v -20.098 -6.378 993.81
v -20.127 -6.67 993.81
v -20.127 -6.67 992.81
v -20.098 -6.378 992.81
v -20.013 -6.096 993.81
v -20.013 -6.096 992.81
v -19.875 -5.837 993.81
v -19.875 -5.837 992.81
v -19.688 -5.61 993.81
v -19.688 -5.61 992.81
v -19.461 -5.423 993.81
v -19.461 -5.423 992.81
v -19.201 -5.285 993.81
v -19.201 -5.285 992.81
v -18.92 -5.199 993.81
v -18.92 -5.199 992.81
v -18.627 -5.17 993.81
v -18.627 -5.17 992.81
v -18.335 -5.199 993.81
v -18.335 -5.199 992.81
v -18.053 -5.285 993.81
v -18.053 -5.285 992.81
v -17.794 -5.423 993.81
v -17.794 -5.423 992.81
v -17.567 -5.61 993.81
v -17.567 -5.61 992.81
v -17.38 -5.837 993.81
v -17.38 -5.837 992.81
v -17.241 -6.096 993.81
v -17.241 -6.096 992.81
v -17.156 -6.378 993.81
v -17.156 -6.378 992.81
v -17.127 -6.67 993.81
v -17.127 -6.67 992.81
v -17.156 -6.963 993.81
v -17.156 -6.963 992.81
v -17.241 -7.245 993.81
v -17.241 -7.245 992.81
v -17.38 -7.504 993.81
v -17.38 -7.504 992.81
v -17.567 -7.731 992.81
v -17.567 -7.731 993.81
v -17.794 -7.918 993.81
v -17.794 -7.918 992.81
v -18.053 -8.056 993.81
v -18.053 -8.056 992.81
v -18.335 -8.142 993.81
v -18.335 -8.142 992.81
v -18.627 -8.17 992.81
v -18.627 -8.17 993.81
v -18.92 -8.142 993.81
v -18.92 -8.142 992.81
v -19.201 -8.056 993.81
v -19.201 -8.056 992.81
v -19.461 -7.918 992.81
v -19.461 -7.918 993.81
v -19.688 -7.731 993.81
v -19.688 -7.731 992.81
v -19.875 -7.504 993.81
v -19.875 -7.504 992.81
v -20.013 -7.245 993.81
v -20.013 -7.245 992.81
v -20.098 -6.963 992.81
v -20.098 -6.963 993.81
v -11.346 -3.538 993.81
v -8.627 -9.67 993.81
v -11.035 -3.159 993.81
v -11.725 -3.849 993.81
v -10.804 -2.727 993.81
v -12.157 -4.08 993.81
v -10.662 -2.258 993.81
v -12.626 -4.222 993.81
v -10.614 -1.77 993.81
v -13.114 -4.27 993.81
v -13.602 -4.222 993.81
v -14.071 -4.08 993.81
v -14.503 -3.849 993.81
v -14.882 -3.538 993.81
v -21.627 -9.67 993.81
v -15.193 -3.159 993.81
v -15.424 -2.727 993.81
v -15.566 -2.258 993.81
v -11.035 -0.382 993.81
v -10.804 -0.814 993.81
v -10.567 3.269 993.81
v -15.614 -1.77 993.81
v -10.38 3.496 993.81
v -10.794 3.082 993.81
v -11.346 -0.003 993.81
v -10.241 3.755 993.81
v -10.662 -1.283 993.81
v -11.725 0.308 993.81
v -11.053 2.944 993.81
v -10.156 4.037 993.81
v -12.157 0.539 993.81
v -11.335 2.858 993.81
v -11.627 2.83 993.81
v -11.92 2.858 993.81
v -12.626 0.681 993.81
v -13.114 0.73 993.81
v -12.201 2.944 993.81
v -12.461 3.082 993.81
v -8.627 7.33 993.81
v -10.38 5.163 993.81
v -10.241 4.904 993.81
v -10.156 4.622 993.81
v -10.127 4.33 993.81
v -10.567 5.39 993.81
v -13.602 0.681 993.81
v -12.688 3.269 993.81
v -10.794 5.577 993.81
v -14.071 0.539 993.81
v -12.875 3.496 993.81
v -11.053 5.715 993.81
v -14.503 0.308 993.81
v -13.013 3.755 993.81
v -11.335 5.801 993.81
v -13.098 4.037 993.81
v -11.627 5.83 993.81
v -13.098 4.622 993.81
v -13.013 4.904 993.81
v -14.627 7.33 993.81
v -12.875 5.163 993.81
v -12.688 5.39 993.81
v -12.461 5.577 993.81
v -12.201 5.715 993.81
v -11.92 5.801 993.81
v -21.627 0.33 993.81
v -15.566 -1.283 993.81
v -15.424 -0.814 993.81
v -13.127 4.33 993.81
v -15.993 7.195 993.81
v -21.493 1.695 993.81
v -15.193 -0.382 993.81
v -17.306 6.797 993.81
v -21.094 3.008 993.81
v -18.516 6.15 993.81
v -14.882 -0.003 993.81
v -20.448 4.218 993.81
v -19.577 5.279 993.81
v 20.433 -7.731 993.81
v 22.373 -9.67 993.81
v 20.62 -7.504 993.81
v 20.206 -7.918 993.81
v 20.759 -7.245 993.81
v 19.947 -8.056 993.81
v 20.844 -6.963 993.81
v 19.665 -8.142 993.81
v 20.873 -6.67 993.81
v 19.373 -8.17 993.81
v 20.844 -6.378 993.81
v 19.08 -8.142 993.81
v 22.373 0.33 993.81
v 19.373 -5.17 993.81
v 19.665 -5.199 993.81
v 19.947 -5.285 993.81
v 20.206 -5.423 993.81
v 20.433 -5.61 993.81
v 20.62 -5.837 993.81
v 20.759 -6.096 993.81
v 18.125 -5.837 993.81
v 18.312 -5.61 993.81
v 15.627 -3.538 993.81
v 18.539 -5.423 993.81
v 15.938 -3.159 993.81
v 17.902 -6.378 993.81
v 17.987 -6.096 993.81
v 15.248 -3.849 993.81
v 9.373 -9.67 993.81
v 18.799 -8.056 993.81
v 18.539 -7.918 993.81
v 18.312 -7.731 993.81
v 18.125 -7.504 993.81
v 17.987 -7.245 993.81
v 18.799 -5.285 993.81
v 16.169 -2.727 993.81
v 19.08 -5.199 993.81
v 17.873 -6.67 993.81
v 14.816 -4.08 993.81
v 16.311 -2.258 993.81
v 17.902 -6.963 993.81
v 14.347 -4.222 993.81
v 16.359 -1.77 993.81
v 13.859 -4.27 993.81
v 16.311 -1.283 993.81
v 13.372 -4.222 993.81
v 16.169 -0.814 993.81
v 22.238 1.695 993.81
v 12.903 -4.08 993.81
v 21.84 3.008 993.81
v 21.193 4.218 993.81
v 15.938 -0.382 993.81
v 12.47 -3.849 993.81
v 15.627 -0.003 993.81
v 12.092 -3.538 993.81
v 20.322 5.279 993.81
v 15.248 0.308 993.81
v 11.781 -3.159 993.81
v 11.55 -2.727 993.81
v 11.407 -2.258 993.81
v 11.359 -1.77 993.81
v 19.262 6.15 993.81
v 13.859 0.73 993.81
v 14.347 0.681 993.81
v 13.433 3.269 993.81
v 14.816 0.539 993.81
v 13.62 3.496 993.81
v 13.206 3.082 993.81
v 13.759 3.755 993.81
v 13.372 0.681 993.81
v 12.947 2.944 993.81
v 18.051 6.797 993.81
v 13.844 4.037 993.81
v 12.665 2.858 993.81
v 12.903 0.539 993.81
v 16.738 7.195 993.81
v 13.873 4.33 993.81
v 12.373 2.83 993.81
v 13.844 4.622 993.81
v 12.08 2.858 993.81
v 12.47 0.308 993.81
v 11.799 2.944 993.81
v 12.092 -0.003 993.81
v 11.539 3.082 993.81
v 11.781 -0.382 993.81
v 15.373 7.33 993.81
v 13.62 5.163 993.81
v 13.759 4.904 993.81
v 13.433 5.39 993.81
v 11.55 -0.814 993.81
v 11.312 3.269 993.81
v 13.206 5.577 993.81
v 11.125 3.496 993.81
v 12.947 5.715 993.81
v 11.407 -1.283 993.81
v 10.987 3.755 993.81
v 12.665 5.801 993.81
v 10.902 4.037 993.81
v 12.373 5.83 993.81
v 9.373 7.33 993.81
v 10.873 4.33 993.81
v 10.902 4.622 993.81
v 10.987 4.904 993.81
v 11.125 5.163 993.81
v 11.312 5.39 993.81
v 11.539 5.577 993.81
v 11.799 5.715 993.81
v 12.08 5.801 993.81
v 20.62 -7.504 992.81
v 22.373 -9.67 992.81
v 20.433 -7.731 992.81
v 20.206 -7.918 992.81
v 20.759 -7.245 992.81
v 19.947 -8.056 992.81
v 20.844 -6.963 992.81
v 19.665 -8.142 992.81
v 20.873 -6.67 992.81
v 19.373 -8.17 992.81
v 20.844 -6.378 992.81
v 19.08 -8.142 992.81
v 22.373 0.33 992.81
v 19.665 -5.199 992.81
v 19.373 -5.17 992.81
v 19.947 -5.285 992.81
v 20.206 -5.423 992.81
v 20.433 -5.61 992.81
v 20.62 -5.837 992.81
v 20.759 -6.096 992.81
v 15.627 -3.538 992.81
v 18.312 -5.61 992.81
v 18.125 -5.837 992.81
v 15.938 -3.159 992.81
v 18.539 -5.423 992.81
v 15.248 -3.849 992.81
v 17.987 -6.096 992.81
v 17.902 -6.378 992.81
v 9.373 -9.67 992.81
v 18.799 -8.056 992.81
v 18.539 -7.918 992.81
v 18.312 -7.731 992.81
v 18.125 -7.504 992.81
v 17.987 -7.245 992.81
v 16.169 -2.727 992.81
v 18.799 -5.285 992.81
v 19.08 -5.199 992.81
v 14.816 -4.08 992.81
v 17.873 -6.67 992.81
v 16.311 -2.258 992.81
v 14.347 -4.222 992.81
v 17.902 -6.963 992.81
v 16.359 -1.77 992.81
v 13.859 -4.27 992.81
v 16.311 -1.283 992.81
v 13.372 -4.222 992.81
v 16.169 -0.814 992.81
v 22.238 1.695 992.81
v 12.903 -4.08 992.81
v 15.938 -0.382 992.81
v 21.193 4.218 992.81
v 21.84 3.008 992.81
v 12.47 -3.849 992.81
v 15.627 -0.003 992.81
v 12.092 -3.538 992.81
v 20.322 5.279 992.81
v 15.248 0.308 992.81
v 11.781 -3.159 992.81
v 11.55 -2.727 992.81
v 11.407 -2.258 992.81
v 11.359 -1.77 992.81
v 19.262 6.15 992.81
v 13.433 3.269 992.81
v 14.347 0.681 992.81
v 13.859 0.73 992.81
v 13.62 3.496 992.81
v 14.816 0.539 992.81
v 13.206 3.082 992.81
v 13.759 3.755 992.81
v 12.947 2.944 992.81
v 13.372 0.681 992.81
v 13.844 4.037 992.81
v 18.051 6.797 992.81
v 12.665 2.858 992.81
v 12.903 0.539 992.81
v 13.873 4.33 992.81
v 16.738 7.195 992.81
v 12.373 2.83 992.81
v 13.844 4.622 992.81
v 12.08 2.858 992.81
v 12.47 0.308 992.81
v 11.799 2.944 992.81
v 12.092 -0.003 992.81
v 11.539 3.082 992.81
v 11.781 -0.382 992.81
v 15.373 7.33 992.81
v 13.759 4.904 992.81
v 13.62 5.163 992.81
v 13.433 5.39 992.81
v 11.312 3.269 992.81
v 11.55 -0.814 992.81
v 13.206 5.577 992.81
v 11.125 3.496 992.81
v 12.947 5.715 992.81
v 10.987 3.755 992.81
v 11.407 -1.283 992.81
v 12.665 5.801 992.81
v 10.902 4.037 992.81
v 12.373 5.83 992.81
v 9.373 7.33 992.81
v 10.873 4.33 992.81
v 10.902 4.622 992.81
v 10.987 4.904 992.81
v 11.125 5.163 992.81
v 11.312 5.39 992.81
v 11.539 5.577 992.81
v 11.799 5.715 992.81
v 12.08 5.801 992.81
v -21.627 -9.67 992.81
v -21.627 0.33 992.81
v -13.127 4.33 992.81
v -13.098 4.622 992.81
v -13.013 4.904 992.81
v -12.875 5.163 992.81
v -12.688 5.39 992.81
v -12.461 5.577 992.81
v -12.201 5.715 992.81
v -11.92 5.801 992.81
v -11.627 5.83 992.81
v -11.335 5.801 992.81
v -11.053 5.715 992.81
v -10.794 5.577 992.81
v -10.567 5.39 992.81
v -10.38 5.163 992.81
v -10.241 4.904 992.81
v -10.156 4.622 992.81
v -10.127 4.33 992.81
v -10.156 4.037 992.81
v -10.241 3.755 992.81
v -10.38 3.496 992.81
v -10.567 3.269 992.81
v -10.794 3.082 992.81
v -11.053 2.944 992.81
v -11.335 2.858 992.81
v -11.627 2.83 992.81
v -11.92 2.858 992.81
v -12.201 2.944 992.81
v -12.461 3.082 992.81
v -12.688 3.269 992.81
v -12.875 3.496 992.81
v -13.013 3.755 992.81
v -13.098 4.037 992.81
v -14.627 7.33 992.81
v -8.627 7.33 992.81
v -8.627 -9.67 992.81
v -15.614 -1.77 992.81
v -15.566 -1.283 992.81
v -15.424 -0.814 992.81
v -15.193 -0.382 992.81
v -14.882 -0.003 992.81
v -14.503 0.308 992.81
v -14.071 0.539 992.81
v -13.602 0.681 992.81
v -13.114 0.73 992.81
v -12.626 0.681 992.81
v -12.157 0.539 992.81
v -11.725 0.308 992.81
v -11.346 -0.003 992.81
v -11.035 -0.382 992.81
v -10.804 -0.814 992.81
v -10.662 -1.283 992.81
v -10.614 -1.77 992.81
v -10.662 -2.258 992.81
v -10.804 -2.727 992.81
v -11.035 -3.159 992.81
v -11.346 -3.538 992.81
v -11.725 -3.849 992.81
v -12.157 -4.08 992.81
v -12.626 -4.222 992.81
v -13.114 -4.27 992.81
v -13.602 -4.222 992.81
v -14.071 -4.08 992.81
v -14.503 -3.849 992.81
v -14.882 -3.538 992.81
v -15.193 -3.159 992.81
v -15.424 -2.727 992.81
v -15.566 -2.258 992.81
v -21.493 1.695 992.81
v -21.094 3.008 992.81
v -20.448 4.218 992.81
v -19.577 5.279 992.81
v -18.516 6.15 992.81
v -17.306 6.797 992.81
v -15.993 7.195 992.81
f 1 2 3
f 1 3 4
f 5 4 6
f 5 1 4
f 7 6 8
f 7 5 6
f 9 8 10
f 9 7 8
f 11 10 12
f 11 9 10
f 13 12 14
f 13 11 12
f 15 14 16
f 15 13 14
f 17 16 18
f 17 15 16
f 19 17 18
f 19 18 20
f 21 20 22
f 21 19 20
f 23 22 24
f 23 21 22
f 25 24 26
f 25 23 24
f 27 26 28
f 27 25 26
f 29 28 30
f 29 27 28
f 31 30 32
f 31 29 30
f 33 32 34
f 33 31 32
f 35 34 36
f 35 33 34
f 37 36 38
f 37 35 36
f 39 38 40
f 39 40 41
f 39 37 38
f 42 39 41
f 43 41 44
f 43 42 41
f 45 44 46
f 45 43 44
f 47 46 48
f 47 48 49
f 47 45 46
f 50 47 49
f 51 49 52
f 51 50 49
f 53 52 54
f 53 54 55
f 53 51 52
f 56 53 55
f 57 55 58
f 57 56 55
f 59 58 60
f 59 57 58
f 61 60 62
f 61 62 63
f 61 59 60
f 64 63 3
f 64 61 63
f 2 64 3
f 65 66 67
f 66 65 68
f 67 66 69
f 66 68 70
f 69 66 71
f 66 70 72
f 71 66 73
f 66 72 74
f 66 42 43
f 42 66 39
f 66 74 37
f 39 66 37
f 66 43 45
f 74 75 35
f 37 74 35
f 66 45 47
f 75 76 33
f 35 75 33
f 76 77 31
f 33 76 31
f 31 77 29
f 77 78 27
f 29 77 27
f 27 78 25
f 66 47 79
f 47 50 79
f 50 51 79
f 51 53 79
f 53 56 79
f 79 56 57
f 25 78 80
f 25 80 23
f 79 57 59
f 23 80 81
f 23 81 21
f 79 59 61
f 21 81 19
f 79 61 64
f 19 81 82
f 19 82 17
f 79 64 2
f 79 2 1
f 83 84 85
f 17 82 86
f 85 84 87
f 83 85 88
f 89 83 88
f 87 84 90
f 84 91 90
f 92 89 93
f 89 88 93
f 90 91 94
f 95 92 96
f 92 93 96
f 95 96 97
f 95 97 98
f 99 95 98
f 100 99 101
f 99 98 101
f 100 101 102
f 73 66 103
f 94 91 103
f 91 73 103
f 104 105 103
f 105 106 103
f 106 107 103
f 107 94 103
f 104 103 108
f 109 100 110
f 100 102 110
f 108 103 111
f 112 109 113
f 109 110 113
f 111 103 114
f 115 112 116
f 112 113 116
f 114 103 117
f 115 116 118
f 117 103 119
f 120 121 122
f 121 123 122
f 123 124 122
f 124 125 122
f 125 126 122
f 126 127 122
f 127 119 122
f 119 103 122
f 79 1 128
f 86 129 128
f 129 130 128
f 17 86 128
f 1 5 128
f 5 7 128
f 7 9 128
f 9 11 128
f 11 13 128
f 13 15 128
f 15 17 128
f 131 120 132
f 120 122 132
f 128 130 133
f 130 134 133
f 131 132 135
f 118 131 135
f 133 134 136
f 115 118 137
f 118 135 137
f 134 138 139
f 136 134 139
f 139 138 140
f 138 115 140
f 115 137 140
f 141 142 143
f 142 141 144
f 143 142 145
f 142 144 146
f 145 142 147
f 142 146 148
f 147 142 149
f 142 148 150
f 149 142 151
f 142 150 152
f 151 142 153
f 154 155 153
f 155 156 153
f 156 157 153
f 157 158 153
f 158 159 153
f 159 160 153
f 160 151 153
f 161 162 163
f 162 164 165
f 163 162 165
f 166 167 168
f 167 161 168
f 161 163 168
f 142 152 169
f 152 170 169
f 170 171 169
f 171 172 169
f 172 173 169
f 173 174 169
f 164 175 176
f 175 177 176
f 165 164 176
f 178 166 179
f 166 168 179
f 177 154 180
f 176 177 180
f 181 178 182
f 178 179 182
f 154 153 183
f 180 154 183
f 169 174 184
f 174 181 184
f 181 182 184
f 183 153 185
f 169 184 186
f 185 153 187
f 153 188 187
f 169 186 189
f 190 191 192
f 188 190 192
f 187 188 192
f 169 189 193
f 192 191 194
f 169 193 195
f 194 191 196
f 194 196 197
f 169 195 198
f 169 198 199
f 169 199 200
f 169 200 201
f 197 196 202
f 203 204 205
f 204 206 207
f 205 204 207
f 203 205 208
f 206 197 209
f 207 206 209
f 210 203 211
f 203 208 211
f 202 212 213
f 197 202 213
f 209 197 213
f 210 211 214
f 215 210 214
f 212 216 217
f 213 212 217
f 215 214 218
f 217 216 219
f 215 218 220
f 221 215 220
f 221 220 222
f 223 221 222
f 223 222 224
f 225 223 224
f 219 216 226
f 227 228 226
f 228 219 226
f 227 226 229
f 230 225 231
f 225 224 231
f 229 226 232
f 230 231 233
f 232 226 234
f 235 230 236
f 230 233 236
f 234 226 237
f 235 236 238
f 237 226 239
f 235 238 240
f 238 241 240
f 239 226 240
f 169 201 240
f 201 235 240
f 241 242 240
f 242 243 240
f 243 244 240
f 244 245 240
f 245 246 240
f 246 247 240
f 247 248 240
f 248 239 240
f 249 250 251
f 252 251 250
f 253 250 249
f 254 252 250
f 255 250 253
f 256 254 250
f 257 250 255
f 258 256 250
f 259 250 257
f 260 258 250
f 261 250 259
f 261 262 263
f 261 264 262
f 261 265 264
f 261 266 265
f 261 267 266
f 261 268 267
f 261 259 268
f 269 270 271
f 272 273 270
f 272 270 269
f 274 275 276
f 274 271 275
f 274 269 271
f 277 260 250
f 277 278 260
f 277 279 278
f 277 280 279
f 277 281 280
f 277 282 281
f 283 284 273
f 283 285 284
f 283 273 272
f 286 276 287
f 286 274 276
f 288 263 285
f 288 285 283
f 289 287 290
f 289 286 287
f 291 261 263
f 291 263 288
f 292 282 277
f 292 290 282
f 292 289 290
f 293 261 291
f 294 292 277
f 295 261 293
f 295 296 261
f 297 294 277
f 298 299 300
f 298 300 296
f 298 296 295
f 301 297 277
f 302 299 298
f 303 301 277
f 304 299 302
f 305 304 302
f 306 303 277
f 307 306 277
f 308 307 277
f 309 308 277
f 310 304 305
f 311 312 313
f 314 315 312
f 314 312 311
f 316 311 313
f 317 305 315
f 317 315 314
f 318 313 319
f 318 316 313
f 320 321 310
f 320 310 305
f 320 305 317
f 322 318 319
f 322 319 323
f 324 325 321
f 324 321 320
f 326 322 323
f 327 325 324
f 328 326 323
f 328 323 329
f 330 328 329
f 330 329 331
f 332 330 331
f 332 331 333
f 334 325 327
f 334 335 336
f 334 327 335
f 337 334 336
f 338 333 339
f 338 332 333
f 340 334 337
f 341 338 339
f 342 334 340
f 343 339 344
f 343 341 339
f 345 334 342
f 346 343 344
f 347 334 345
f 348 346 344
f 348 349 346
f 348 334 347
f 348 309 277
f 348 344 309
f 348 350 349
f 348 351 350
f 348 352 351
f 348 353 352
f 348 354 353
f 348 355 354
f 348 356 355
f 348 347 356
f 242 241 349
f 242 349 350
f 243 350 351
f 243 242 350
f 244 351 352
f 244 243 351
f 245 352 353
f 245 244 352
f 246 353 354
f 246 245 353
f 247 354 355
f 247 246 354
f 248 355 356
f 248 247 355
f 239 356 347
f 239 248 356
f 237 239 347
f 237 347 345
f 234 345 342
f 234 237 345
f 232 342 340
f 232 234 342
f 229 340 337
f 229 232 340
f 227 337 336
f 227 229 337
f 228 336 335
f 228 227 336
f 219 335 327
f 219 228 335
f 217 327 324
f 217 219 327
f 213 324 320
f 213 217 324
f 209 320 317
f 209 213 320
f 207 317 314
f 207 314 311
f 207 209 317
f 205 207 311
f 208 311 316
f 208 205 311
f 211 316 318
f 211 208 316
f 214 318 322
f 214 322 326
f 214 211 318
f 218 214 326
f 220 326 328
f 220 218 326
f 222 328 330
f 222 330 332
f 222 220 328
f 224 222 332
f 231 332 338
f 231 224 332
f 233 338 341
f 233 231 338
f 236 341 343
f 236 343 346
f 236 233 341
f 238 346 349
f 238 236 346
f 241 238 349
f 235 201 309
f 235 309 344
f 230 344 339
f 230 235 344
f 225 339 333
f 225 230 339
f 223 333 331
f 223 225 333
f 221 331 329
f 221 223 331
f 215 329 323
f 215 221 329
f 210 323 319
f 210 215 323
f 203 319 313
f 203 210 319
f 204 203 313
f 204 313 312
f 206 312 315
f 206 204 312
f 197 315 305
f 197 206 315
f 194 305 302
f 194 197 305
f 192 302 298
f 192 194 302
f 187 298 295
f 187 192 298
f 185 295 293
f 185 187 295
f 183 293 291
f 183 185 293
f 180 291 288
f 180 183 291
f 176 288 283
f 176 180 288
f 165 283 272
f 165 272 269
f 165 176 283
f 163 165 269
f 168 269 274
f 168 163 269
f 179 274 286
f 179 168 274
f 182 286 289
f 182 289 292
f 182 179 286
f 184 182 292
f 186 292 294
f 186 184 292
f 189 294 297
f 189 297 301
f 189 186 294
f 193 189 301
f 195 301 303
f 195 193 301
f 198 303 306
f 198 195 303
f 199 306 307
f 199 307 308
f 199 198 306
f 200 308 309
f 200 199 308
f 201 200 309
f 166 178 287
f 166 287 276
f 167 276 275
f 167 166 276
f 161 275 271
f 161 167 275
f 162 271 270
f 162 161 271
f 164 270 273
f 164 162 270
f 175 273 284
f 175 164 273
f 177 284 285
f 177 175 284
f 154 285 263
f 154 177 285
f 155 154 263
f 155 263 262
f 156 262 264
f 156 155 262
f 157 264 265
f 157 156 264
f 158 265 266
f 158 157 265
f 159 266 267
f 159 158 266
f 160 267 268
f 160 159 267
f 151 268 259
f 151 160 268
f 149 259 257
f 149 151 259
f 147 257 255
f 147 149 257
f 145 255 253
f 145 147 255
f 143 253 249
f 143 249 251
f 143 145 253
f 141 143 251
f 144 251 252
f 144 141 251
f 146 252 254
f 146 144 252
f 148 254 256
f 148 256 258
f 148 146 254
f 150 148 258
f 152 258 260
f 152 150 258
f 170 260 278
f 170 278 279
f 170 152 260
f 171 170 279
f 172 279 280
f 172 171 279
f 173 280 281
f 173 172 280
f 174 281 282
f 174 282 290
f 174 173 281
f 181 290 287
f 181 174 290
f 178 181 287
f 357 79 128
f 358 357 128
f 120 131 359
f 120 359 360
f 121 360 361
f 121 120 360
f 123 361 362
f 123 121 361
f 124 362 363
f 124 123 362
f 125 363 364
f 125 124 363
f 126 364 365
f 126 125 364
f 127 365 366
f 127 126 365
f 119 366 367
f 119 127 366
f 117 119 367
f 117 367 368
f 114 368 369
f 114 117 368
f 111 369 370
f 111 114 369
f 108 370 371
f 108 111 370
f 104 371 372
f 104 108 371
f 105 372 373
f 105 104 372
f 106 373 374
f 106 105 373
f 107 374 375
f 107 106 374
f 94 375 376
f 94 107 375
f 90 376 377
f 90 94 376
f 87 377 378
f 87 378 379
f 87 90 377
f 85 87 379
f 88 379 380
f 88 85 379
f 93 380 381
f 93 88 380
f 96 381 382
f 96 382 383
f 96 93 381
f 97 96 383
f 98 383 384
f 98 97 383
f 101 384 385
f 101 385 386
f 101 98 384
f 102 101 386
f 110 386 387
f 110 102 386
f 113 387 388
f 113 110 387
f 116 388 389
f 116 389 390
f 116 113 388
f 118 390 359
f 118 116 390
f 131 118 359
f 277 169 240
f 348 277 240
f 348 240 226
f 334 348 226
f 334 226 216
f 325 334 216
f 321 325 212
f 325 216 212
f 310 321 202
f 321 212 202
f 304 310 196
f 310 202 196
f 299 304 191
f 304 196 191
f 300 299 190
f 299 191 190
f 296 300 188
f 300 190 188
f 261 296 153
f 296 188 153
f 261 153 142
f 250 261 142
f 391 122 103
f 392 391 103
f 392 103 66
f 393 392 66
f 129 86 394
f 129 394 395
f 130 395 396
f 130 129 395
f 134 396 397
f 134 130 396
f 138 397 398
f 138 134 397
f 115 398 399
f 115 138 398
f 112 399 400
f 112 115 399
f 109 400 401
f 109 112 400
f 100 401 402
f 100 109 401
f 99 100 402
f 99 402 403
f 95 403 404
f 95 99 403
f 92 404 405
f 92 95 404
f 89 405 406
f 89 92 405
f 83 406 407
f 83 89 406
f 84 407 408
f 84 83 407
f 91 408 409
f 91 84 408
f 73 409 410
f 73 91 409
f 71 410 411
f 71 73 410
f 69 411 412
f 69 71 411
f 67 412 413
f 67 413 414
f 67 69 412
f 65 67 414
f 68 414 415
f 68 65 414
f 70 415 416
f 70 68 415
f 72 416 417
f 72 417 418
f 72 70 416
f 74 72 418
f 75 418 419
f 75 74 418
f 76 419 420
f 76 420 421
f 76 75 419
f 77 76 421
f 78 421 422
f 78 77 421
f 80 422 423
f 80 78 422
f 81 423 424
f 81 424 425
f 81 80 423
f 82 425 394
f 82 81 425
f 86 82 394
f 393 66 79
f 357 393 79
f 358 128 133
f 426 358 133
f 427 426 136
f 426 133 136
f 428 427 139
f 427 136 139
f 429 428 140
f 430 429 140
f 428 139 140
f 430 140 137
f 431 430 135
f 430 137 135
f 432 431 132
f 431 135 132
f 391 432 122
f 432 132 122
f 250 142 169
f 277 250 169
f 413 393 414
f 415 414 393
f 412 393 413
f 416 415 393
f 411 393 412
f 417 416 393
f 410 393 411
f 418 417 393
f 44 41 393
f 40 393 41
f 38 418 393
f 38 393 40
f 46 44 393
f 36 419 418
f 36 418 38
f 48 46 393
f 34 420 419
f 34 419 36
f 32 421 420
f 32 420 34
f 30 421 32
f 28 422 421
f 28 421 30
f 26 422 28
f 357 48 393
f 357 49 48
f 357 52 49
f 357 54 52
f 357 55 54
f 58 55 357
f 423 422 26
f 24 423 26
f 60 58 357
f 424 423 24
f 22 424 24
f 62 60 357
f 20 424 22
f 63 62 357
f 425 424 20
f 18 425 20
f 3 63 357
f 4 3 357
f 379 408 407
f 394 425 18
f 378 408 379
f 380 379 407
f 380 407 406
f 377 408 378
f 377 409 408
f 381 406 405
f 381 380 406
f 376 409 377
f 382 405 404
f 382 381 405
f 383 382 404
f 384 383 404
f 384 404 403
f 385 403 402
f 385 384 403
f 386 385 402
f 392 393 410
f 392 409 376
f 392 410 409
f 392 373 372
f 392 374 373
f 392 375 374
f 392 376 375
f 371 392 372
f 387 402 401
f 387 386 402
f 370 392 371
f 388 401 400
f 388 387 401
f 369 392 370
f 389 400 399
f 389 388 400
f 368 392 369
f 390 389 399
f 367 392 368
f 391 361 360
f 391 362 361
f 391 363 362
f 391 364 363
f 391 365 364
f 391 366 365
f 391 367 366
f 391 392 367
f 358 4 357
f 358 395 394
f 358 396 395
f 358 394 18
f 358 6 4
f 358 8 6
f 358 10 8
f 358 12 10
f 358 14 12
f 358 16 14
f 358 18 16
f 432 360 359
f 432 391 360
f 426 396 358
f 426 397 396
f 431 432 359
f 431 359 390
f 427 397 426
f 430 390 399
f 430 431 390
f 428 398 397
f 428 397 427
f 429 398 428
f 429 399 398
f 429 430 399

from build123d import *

# Parameters (mm, degrees)
SKETCH_2_R        = 2.5
SKETCH_2_R_2      = 1.5
EXTRUDE_2_DEPTH   = 1
EXTRUDE_2_2_DEPTH = 1


with BuildPart() as part:
    # 草图2 → 凸台-拉伸2 (new body)
    with BuildSketch(Plane(origin=(0, 0, 993.809706351), x_dir=(-1, 0, 0), z_dir=(0, 0, -1))):
        with BuildLine():
            Line((-9.372681611, 7.329507903), (-15.372681611, 7.329507903))
            ThreePointArc((-15.372681611, 7.329507903), (-20.32242908, 5.279255371), (-22.372681611, 0.329507903))
            Line((-22.372681611, 0.329507903), (-22.372681611, -9.670492097))
            Line((-22.372681611, -9.670492097), (-16.372681611, -9.670492097))
            Line((-16.372681611, -9.670492097), (-9.372681611, -9.670492097))
            Line((-9.372681611, -9.670492097), (-9.372681611, 7.329507903))
        make_face()
        with Locations((-13.859341687, -1.770492097)):
            Circle(SKETCH_2_R, mode=Mode.SUBTRACT)
        with Locations((-12.372681611, 4.329507903)):
            Circle(SKETCH_2_R_2, mode=Mode.SUBTRACT)
        with Locations((-19.372681611, -6.670492097)):
            Circle(SKETCH_2_R_2, mode=Mode.SUBTRACT)
    extrude(amount=EXTRUDE_2_DEPTH)


with BuildPart() as body_2:
    # 草图2 → Extrude 2 2 (new body)
    with BuildSketch(Plane(origin=(0, 0, 993.809706351), x_dir=(-1, 0, 0), z_dir=(0, 0, -1))):
        with BuildLine():
            Line((8.627318389, 7.329507903), (8.627318389, -9.670492097))
            Line((8.627318389, -9.670492097), (21.627318389, -9.670492097))
            Line((21.627318389, -9.670492097), (21.627318389, 0.329507903))
            ThreePointArc((21.627318389, 0.329507903), (19.577065857, 5.279255371), (14.627318389, 7.329507903))
            Line((14.627318389, 7.329507903), (8.627318389, 7.329507903))
        make_face()
        with Locations((13.113978464, -1.770492097)):
            Circle(SKETCH_2_R, mode=Mode.SUBTRACT)
        with Locations((11.627318389, 4.329507903)):
            Circle(SKETCH_2_R_2, mode=Mode.SUBTRACT)
        with Locations((18.627318389, -6.670492097)):
            Circle(SKETCH_2_R_2, mode=Mode.SUBTRACT)
    extrude(amount=EXTRUDE_2_2_DEPTH)


solid = Compound([part.part, body_2.part])
